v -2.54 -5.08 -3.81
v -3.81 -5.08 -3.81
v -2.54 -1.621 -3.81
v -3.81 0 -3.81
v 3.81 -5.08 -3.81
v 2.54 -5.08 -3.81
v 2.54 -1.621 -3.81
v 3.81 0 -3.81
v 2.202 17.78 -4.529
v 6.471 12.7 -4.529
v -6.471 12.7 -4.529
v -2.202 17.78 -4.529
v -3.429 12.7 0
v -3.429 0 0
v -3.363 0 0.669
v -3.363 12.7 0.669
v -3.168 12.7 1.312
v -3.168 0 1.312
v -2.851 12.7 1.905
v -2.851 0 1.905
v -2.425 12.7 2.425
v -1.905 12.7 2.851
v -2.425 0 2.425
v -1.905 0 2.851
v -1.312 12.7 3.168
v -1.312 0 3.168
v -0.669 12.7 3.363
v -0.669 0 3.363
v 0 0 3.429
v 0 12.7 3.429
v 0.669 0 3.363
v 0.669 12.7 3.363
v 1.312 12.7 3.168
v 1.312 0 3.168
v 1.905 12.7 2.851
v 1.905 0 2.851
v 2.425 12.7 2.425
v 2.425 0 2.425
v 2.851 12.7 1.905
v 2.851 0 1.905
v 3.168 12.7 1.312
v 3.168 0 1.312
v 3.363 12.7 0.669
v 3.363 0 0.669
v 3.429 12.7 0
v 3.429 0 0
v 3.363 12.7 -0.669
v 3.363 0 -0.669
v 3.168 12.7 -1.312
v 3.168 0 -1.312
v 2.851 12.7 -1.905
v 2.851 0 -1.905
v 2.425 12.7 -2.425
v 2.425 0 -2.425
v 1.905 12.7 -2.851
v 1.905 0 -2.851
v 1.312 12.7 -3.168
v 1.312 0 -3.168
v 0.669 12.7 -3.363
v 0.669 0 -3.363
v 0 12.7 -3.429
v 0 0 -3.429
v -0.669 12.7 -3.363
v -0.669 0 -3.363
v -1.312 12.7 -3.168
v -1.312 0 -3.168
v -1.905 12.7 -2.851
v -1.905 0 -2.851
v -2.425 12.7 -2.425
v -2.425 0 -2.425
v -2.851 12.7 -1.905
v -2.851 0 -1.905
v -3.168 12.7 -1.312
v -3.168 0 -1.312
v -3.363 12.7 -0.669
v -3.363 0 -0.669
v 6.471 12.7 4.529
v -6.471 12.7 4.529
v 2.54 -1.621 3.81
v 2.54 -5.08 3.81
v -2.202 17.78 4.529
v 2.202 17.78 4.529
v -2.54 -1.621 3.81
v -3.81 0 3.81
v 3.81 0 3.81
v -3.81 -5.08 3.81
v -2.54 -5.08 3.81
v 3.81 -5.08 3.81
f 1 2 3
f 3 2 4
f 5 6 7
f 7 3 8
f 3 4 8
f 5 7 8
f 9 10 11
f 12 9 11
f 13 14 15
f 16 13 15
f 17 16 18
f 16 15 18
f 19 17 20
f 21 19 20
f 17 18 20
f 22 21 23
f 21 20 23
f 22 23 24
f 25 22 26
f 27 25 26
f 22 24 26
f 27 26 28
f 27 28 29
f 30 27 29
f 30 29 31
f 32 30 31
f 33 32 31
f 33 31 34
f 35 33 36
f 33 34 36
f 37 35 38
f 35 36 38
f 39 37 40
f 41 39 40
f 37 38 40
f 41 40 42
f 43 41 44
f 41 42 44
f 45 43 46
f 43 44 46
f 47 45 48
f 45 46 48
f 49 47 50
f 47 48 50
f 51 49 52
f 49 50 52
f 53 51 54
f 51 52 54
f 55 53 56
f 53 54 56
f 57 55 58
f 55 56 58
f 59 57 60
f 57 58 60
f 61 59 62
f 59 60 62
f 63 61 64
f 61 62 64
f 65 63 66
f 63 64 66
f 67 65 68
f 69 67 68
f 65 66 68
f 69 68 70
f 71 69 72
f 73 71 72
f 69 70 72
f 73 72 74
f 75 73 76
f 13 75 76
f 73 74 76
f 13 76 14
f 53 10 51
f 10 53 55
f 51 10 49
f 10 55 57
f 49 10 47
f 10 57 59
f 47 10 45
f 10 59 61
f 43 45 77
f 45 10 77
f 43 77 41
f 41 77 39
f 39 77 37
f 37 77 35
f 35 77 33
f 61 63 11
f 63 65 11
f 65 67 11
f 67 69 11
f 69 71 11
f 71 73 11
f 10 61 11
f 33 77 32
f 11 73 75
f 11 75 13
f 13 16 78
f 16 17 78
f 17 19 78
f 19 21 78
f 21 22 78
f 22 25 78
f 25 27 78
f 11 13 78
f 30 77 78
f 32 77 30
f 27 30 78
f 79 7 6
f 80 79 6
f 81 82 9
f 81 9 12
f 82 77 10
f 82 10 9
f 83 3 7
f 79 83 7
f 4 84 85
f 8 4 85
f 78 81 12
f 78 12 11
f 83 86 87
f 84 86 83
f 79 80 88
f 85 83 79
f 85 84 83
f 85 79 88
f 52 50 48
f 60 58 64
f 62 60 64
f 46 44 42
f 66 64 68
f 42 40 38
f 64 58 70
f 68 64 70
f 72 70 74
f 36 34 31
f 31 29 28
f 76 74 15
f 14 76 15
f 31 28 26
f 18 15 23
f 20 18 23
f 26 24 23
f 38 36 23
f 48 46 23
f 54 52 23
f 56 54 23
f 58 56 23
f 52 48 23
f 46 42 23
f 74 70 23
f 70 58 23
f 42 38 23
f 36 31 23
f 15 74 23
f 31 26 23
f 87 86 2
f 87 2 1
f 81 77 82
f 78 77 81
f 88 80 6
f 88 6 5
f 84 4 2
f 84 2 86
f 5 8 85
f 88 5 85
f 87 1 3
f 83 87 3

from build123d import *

# Parameters (mm, degrees)
F0_W     = 7.62
F0_H     = 7.62
F1_DEPTH = 5.08
F3_DEPTH = 25.4
F4_R     = 3.429
F5_DEPTH = 12.7
F6_W     = 12.942478
F6_H     = 9.058966
F7_DEPTH = 5.08
F9_DEPTH = 25.4


with BuildPart() as f1:
    # F0 (on Front) → F1 (new body)
    with BuildSketch(Plane.XZ):
        Rectangle(F0_W, F0_H)
    extrude(amount=F1_DEPTH)

    # F2 (on face) → F3 (cut)
    with BuildSketch(Plane(origin=(0, 0, -3.81), x_dir=(1, 0, 0), z_dir=(0, 0, -1))):
        Polygon((-2.54, 1.621454), (0, 1.621454), (2.54, 1.621454), (2.54, 5.08), (0, 5.08), (-2.54, 5.08), align=None)
    extrude(amount=-F3_DEPTH, mode=Mode.SUBTRACT)


with BuildPart() as f5:
    # F4 (on face) → F5 (new body)
    with BuildSketch(Plane(origin=(0, 0, 0), x_dir=(-1, 0, 0), z_dir=(0, 1, 0))):
        Circle(F4_R)
    extrude(amount=F5_DEPTH)

    # F6 (on face) → F7 (join)
    with BuildSketch(Plane(origin=(0, 12.7, 0), x_dir=(-1, 0, 0), z_dir=(0, 1, 0))):
        Rectangle(F6_W, F6_H)
    extrude(amount=F7_DEPTH)

    # F8 (on face) → F9 (cut)
    with BuildSketch(Plane(origin=(0, 0, -4.529483), x_dir=(1, 0, 0), z_dir=(0, 0, -1))):
        Polygon((-2.202071, -17.78), (-6.471239, -12.7), (-6.471239, -17.78), align=None)
        Polygon((6.471239, -17.78), (6.471239, -12.7), (2.202071, -17.78), align=None)
    extrude(amount=-F9_DEPTH, mode=Mode.SUBTRACT)


solid = Compound([f1.part, f5.part])
